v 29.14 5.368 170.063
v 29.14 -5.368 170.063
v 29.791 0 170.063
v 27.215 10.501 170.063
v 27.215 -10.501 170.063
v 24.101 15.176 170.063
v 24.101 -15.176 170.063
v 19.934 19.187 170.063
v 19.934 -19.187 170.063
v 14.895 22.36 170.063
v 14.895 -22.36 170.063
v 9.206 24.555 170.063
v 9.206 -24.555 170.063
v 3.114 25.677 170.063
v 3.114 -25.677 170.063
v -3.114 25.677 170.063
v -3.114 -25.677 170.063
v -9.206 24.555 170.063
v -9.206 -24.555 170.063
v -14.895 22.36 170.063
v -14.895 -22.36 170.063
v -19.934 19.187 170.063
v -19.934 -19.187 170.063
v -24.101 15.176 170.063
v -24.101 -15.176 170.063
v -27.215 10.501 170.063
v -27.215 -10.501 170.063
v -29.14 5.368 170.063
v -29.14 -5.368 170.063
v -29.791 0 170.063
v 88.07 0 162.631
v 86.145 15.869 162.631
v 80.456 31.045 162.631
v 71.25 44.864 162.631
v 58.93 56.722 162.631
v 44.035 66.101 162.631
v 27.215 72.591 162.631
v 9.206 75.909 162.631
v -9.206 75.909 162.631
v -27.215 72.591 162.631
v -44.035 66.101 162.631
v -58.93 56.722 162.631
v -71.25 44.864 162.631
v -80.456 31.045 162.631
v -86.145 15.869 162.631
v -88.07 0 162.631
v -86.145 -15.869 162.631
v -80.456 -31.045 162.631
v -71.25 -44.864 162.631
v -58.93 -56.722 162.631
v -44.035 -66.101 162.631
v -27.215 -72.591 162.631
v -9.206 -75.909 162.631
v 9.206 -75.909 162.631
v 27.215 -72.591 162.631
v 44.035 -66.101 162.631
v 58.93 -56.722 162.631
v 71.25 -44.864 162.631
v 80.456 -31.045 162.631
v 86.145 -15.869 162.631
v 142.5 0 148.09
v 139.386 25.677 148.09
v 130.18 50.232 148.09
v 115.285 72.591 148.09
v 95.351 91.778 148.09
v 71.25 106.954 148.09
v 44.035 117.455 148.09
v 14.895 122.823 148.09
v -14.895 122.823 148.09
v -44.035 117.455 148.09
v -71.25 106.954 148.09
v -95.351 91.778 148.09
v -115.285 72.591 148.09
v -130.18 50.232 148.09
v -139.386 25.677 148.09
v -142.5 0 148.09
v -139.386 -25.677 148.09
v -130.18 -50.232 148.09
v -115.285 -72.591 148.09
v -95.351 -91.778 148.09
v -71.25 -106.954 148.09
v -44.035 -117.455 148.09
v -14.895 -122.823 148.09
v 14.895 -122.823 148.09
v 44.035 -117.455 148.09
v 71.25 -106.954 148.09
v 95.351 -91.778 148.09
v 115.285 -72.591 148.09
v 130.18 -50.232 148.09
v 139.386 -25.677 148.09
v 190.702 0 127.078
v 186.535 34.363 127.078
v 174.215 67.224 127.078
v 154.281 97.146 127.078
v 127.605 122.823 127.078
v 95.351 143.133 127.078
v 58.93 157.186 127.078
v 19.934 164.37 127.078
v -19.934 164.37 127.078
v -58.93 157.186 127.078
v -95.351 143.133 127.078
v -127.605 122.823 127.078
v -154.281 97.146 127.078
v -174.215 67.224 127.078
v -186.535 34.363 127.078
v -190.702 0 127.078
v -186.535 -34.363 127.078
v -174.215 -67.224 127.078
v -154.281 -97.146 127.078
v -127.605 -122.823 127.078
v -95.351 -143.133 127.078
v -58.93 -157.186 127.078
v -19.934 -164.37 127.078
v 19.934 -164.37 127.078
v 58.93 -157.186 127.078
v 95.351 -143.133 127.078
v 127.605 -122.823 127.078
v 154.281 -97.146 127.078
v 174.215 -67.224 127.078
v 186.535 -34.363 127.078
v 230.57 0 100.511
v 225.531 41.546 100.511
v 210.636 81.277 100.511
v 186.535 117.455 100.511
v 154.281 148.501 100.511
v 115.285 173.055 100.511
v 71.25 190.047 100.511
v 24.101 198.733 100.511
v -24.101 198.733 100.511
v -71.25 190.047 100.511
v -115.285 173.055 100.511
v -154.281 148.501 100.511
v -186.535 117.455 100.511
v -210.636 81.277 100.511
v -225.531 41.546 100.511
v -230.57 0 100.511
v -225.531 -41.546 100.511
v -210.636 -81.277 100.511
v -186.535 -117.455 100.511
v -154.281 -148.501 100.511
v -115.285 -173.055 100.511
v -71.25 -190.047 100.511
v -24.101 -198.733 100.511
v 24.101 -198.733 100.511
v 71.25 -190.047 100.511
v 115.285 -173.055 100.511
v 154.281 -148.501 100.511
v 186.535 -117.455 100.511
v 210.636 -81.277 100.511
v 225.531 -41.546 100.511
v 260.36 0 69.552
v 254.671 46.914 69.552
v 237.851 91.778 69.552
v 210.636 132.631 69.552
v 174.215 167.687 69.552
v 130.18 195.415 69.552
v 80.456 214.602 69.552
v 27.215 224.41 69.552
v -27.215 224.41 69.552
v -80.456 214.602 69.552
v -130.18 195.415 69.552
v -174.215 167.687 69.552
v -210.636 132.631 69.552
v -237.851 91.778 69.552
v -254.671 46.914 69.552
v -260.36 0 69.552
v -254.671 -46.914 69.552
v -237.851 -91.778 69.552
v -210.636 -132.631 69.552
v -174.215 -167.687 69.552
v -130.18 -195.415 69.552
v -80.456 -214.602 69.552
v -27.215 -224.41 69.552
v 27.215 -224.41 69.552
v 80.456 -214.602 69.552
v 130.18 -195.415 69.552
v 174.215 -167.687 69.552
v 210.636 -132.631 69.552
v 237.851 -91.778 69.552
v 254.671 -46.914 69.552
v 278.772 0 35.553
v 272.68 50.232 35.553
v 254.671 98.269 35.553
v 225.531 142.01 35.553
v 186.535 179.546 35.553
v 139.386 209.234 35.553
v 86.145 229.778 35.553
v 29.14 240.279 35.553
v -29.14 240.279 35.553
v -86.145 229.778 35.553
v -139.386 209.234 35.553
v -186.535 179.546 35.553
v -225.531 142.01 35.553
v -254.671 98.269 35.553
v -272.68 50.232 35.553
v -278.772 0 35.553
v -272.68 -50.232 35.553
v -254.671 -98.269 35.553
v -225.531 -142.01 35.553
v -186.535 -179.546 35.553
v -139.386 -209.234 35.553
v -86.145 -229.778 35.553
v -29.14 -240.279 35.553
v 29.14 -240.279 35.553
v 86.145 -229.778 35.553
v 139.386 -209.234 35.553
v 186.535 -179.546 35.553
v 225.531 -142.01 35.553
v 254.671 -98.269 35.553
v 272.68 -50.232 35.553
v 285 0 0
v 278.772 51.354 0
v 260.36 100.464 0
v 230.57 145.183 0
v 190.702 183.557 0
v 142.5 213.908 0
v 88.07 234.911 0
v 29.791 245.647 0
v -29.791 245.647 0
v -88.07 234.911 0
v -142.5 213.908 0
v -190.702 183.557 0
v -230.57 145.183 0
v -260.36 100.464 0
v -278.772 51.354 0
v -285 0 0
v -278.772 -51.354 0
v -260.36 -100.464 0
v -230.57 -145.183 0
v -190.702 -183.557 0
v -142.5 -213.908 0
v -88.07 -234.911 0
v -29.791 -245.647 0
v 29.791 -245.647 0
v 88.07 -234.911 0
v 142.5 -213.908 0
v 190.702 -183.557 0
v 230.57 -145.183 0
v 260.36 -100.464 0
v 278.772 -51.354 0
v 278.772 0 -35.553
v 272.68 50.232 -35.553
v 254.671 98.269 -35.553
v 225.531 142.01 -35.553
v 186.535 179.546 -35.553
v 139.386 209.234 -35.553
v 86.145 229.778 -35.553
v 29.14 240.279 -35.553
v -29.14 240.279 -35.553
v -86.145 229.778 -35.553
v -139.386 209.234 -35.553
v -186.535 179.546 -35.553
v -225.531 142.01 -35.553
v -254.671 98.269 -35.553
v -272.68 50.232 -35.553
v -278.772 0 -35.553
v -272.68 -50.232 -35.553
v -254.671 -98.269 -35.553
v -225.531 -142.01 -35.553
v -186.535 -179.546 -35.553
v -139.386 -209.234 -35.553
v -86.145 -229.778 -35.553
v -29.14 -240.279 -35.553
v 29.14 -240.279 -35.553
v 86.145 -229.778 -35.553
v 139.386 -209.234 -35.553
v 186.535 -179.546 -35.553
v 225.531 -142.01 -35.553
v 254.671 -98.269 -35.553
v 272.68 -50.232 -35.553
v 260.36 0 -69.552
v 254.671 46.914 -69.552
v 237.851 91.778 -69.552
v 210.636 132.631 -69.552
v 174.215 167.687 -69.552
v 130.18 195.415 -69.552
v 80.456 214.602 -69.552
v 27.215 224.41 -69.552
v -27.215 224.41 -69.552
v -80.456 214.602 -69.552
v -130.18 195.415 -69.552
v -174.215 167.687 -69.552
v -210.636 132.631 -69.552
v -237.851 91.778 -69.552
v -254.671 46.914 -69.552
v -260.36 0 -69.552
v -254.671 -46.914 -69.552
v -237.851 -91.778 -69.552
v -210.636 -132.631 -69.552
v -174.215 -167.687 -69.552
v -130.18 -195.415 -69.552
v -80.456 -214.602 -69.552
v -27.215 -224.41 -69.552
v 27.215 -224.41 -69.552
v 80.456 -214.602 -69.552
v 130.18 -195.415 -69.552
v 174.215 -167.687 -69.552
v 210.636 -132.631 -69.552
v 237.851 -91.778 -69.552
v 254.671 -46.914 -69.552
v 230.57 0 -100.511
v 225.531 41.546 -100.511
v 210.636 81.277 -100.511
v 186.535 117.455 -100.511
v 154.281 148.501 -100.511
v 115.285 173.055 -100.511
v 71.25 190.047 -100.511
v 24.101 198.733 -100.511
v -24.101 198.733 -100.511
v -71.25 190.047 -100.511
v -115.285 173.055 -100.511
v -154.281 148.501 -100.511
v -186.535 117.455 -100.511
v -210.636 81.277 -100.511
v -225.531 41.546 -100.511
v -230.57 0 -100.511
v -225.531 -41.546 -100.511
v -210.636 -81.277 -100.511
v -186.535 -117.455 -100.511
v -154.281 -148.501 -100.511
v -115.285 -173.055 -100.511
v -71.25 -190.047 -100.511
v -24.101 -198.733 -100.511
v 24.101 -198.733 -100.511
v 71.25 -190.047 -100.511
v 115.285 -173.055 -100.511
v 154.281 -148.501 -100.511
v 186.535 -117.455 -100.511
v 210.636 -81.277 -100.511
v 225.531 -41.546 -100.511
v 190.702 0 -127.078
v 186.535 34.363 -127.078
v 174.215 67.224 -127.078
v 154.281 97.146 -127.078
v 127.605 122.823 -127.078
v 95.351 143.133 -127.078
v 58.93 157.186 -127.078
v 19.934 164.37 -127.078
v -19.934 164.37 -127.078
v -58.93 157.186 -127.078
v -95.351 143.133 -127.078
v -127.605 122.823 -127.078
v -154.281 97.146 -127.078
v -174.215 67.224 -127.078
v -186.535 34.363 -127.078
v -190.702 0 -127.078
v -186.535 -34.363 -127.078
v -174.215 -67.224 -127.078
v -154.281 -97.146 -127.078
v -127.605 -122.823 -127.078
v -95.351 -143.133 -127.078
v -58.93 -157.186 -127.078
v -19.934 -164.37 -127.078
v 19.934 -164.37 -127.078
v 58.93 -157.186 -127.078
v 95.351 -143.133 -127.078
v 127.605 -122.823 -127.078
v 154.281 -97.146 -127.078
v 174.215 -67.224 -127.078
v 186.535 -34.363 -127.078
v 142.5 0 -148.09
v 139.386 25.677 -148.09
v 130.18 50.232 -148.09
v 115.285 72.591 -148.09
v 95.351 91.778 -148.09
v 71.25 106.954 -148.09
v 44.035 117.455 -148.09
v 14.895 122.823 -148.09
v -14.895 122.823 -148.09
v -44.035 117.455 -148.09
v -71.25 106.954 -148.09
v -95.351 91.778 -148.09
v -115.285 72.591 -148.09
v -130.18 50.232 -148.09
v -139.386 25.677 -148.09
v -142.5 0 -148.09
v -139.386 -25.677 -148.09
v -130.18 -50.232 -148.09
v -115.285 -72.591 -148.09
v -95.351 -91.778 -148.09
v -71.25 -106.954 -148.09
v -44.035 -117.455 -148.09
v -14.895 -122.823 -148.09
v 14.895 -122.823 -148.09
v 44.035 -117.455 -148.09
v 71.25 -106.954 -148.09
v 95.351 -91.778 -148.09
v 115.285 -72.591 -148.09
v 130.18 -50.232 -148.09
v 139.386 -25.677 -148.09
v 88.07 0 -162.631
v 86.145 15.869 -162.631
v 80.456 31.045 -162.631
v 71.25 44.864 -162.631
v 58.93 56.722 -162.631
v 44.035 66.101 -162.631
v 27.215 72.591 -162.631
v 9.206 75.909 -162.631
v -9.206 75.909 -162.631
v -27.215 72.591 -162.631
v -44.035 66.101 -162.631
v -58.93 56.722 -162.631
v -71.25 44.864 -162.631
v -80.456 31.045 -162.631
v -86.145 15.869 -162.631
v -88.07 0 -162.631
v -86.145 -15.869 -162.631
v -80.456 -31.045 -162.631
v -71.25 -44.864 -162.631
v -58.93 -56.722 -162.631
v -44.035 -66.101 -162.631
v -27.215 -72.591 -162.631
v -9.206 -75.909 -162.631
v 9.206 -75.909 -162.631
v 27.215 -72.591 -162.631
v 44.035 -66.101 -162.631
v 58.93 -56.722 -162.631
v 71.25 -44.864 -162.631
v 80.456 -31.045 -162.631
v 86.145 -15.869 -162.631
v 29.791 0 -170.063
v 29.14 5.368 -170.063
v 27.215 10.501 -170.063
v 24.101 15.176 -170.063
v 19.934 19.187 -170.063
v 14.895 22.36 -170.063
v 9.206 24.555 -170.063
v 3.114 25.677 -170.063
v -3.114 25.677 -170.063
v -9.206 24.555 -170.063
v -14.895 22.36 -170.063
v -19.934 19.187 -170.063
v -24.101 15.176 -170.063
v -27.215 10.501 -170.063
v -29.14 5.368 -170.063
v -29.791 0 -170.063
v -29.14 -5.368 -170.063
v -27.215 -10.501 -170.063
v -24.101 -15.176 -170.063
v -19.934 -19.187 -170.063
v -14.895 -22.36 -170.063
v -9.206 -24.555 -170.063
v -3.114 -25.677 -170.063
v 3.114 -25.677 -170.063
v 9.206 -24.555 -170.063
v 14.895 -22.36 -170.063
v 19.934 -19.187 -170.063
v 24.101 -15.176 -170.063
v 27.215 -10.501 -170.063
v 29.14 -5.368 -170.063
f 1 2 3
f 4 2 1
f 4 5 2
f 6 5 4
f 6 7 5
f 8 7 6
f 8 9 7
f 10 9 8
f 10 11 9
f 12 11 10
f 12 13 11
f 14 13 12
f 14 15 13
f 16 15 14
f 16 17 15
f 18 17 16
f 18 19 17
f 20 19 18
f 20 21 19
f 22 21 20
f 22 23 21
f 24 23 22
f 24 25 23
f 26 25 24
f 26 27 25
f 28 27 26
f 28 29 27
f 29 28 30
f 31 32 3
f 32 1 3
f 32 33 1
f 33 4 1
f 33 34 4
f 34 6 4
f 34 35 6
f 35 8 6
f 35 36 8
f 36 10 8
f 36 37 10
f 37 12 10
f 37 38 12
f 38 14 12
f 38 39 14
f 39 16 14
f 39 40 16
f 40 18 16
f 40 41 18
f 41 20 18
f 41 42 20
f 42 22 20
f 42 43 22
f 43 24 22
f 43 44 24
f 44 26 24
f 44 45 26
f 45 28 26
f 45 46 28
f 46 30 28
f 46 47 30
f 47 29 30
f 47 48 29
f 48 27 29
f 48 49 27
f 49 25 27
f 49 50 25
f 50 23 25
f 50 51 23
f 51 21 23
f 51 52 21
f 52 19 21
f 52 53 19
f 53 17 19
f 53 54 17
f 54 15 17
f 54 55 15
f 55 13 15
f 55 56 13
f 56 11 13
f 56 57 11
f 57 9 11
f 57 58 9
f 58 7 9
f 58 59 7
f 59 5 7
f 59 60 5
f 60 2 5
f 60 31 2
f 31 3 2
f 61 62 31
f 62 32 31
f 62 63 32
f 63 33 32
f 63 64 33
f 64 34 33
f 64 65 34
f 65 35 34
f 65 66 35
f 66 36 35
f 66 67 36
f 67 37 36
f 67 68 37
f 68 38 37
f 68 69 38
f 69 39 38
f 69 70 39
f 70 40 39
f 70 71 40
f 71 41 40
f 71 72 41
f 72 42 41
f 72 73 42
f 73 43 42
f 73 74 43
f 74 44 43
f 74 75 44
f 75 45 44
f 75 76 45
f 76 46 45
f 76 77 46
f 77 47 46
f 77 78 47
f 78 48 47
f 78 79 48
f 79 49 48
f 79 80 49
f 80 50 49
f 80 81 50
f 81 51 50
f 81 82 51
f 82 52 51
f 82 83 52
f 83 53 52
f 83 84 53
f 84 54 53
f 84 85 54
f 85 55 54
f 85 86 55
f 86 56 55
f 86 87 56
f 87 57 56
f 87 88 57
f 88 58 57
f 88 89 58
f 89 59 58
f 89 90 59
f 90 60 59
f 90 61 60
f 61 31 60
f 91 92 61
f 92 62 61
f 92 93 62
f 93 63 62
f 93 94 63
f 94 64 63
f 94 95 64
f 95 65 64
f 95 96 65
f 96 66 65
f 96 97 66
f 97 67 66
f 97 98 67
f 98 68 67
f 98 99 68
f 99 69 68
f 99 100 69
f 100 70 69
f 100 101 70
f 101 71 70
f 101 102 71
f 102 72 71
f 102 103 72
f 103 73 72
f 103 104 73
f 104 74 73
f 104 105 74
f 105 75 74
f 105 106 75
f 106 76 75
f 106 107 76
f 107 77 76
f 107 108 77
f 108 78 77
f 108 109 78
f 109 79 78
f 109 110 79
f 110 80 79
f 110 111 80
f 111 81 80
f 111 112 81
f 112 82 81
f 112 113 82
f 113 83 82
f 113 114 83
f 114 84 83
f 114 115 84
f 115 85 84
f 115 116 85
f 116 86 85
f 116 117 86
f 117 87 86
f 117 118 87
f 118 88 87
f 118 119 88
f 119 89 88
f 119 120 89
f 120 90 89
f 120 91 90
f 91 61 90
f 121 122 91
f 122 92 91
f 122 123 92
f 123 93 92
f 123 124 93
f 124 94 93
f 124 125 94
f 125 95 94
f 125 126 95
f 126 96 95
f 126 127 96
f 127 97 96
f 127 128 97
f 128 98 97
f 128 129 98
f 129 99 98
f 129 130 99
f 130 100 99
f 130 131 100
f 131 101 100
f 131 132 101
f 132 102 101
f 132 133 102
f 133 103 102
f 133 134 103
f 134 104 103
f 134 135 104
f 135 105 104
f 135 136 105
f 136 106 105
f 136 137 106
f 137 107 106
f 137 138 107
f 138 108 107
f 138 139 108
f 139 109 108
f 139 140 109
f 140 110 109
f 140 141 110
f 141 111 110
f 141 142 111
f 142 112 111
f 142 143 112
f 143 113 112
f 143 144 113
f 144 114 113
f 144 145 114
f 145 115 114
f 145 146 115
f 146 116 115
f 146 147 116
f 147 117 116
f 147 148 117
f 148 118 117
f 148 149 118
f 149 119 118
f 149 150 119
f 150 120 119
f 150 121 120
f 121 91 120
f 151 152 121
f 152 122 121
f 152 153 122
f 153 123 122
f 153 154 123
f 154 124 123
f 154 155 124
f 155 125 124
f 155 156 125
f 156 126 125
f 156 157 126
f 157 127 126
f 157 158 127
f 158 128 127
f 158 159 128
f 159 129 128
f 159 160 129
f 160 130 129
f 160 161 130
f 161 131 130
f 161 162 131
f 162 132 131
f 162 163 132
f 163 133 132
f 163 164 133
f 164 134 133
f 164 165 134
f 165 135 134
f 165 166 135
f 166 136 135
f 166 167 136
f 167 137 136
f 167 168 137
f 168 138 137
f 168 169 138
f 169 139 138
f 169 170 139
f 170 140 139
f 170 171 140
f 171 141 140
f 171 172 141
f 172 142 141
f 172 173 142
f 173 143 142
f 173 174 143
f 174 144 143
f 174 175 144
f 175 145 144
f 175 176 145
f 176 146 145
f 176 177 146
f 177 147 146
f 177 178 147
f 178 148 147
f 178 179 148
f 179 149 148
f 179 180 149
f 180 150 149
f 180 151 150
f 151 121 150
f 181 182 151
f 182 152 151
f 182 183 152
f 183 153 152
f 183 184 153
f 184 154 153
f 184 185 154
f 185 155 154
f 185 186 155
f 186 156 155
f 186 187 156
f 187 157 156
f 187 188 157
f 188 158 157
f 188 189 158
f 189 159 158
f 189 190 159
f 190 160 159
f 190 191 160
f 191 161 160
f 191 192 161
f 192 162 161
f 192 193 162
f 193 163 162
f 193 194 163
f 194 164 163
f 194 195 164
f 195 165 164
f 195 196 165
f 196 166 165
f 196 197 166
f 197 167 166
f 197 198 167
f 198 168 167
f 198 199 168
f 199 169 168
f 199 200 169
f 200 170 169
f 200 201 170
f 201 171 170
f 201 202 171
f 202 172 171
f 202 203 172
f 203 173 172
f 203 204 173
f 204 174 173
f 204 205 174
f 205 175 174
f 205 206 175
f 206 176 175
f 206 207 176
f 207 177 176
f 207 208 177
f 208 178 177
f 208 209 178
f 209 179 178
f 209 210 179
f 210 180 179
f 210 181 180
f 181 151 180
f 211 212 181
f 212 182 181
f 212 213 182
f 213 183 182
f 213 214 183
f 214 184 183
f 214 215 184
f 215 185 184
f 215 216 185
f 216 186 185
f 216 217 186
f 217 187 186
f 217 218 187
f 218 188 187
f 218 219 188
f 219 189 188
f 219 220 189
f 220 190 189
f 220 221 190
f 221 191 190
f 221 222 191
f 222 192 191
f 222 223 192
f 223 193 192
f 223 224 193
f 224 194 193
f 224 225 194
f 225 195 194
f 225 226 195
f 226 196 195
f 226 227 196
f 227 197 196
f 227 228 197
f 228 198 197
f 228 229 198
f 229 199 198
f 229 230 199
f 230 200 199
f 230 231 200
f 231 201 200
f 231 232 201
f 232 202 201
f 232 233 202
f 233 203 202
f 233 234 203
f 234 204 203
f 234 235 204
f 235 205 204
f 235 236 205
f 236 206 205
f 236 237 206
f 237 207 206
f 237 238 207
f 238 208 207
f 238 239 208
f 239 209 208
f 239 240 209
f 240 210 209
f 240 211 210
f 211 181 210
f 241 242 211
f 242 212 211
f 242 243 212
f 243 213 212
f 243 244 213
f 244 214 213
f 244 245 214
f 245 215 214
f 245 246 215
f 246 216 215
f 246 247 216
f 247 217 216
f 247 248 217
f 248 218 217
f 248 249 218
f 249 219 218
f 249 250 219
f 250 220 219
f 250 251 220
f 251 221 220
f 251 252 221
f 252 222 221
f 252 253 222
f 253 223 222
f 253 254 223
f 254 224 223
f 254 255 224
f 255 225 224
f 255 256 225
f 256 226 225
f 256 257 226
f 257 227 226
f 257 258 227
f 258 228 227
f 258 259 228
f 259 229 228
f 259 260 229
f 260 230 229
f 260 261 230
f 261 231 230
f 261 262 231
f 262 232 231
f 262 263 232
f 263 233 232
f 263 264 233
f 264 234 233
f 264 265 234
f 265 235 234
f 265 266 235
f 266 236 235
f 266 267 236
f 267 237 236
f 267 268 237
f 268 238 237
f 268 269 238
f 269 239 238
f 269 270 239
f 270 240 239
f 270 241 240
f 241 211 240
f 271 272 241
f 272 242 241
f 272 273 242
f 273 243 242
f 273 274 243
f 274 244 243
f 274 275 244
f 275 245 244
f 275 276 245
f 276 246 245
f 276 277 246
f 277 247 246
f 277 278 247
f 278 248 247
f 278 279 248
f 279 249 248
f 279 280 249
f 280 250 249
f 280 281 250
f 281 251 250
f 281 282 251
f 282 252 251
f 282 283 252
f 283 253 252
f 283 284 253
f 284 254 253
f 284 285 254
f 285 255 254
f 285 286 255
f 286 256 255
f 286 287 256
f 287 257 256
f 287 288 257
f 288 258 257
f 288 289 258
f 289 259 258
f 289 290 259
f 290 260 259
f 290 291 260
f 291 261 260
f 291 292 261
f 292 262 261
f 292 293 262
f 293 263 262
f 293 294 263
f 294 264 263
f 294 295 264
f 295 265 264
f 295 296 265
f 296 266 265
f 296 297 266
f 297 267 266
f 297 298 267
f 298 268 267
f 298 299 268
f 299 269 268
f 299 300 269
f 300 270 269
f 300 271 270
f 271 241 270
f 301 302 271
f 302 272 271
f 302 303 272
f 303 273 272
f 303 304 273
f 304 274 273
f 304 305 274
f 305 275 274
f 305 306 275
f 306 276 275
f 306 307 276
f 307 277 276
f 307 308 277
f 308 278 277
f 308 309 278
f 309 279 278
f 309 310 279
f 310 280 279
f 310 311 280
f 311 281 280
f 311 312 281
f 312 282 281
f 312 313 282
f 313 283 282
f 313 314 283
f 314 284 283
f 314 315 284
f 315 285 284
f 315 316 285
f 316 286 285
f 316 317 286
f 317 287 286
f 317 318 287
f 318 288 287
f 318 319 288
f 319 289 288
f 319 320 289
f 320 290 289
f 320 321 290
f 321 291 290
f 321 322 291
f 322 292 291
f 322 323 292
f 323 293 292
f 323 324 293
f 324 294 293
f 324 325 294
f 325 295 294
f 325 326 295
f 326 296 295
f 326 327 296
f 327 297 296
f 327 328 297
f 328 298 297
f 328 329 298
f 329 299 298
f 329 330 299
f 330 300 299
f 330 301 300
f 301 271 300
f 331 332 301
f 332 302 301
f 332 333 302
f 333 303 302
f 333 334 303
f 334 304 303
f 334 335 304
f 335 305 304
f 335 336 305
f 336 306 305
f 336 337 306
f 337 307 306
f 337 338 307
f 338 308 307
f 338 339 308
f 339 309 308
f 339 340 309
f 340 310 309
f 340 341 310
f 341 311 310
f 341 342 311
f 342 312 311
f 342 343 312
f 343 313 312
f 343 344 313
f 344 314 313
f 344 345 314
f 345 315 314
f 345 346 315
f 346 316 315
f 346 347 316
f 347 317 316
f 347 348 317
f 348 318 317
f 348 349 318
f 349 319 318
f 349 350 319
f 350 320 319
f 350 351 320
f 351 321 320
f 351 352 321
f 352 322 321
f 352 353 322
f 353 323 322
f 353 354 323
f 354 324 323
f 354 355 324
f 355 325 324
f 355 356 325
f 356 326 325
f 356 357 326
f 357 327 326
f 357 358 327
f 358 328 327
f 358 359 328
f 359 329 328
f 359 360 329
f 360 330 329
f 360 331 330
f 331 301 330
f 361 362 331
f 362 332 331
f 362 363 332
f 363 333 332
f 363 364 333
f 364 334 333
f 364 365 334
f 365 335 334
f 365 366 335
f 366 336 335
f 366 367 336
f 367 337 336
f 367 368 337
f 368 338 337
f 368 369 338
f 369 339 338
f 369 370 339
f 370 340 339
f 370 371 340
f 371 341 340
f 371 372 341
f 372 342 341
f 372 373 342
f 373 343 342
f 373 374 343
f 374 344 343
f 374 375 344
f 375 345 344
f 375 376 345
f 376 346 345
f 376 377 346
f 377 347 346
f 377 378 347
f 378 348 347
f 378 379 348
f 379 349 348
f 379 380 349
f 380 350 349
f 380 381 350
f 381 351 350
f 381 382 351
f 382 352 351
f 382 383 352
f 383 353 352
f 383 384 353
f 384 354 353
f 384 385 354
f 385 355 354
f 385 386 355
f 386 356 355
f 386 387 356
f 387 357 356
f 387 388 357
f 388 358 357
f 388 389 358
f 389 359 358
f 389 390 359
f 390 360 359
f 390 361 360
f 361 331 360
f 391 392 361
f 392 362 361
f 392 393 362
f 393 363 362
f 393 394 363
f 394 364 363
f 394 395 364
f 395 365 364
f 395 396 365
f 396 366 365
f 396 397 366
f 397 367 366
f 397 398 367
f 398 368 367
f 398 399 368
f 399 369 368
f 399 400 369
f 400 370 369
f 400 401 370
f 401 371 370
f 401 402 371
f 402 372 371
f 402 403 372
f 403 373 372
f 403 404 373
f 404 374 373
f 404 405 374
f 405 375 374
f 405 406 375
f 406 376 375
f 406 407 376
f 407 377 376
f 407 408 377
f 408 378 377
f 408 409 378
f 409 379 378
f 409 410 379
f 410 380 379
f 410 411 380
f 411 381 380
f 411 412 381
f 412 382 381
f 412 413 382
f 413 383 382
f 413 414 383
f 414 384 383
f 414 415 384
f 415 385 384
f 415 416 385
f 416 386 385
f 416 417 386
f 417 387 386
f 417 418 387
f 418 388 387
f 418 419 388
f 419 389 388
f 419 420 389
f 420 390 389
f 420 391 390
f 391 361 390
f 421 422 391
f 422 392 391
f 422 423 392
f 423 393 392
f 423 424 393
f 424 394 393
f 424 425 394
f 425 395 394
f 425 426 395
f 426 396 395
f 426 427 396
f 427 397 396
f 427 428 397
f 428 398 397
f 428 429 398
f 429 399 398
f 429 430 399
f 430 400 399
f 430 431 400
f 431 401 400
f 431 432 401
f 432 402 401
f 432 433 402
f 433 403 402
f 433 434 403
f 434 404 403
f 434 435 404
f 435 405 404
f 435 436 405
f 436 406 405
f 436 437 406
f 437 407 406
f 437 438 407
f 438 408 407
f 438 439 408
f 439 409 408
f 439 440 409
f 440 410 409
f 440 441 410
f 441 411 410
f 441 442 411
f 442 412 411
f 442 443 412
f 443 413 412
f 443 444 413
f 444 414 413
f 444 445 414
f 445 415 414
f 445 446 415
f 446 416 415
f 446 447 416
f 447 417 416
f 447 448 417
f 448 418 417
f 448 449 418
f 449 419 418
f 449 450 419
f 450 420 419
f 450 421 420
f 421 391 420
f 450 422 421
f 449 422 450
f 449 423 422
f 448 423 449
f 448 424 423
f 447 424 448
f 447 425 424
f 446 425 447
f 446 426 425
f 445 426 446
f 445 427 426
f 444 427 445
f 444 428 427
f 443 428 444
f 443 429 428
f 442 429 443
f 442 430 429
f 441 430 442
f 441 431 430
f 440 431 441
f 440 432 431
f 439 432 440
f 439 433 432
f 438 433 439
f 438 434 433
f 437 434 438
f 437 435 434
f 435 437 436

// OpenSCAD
// Generated by SolidPython 1.0.1 on 2020-07-29 00:46:52


scale(v = [15, 13, 9]) {
	sphere(r = 19);
}
/***********************************************
*********      SolidPython code:      **********
************************************************
 
# import packages: SolidPython
from solid import *
from solid.utils import *
from itertools import chain, combinations, permutations


class Resize:

    def __init__(self, scad_file):
        self.scad_file = scad_file
        #self.scad_file = import_scad(scad_file)
        # cone/cylinder param:
        self.r1 = 0
        self.r2 = 0
        self.h = 0
        # rectangular prism param:
        self.w = 0
        self.l = 0
        # ellipse param:
        self.r = 0

    # import OpenScad code (file name corresponds to shape)


    # classify shape + parameters
    def assign(self, param1, param2, param3):
        if self.scad_file == 'cone.scad':
            self.r1 = param1
            self.r2 = param2
            self.h = param3
        elif self.scad_file == 'cylinder.scad':
            self.r1 = param1
            self.r2 = param2
            self.h = param3
        elif self.scad_file == 'rectangularPrism.scad':
            self.h = param1
            self.l = param2
            self.w = param3
        else:
            self.r = param1
            self.h = param2

    # resize parameters
    def iterate(self):
        x = range(3, 20, 2)
        i = 1
        if self.scad_file == 'cone.scad':
            tempList = list(permutations(x, 2))
            for temp in tempList:
                param1 = temp[0]
                param2 = temp[1]
                filepath = 'produced_scad_files/' + 'cone' + str(param1) + '_' + str(param2) + '_' + '.scad'
                scad_render_to_file(cylinder(h=param1, r1=param2, r2=0), filepath)

        elif self.scad_file == 'cylinder.scad':
            tempList = list(permutations(x, 3))
            for temp in tempList:
                param1 = temp[0]
                param2 = temp[1]
                filepath = 'produced_scad_files/' + 'cylinder' + str(param1) + '_' + str(param2) + '_' + '.scad'
                scad_render_to_file(cylinder(h=param1, r1=param2, r2=param2), filepath)

        elif self.scad_file == 'rectangularPrism.scad':
            tempList = list(permutations(x, 3))
            for temp in tempList:
                param1 = temp[0]
                param2 = temp[1]
                param3 = temp[2]
                filepath = 'produced_scad_files/' + 'rectangularPrism' + str(param1) + '_' + str(param2) + '_' + str(
                    param3) + '.scad'
                scad_render_to_file(cube(size=(param1, param2, param3)), filepath)

        elif self.scad_file == 'ellipse.scad':
            tempList = list(permutations(x, 4))
            for temp in tempList:
                param1 = temp[0]
                param2 = temp[1]
                param3 = temp[2]
                param4 = temp[3]
                filepath = 'produced_scad_files/' + 'ellipse' + str(param1) + '_' + str(param2) + '_' + str(param3) + '_' + str(param4) + '.scad'
                scad_render_to_file(scale([param1, param2, param3])(sphere(r=param4)), filepath)

    def render_to_scadfile(self):
        scad_render_to_file(scad, 'example.scad') 
 
************************************************/
